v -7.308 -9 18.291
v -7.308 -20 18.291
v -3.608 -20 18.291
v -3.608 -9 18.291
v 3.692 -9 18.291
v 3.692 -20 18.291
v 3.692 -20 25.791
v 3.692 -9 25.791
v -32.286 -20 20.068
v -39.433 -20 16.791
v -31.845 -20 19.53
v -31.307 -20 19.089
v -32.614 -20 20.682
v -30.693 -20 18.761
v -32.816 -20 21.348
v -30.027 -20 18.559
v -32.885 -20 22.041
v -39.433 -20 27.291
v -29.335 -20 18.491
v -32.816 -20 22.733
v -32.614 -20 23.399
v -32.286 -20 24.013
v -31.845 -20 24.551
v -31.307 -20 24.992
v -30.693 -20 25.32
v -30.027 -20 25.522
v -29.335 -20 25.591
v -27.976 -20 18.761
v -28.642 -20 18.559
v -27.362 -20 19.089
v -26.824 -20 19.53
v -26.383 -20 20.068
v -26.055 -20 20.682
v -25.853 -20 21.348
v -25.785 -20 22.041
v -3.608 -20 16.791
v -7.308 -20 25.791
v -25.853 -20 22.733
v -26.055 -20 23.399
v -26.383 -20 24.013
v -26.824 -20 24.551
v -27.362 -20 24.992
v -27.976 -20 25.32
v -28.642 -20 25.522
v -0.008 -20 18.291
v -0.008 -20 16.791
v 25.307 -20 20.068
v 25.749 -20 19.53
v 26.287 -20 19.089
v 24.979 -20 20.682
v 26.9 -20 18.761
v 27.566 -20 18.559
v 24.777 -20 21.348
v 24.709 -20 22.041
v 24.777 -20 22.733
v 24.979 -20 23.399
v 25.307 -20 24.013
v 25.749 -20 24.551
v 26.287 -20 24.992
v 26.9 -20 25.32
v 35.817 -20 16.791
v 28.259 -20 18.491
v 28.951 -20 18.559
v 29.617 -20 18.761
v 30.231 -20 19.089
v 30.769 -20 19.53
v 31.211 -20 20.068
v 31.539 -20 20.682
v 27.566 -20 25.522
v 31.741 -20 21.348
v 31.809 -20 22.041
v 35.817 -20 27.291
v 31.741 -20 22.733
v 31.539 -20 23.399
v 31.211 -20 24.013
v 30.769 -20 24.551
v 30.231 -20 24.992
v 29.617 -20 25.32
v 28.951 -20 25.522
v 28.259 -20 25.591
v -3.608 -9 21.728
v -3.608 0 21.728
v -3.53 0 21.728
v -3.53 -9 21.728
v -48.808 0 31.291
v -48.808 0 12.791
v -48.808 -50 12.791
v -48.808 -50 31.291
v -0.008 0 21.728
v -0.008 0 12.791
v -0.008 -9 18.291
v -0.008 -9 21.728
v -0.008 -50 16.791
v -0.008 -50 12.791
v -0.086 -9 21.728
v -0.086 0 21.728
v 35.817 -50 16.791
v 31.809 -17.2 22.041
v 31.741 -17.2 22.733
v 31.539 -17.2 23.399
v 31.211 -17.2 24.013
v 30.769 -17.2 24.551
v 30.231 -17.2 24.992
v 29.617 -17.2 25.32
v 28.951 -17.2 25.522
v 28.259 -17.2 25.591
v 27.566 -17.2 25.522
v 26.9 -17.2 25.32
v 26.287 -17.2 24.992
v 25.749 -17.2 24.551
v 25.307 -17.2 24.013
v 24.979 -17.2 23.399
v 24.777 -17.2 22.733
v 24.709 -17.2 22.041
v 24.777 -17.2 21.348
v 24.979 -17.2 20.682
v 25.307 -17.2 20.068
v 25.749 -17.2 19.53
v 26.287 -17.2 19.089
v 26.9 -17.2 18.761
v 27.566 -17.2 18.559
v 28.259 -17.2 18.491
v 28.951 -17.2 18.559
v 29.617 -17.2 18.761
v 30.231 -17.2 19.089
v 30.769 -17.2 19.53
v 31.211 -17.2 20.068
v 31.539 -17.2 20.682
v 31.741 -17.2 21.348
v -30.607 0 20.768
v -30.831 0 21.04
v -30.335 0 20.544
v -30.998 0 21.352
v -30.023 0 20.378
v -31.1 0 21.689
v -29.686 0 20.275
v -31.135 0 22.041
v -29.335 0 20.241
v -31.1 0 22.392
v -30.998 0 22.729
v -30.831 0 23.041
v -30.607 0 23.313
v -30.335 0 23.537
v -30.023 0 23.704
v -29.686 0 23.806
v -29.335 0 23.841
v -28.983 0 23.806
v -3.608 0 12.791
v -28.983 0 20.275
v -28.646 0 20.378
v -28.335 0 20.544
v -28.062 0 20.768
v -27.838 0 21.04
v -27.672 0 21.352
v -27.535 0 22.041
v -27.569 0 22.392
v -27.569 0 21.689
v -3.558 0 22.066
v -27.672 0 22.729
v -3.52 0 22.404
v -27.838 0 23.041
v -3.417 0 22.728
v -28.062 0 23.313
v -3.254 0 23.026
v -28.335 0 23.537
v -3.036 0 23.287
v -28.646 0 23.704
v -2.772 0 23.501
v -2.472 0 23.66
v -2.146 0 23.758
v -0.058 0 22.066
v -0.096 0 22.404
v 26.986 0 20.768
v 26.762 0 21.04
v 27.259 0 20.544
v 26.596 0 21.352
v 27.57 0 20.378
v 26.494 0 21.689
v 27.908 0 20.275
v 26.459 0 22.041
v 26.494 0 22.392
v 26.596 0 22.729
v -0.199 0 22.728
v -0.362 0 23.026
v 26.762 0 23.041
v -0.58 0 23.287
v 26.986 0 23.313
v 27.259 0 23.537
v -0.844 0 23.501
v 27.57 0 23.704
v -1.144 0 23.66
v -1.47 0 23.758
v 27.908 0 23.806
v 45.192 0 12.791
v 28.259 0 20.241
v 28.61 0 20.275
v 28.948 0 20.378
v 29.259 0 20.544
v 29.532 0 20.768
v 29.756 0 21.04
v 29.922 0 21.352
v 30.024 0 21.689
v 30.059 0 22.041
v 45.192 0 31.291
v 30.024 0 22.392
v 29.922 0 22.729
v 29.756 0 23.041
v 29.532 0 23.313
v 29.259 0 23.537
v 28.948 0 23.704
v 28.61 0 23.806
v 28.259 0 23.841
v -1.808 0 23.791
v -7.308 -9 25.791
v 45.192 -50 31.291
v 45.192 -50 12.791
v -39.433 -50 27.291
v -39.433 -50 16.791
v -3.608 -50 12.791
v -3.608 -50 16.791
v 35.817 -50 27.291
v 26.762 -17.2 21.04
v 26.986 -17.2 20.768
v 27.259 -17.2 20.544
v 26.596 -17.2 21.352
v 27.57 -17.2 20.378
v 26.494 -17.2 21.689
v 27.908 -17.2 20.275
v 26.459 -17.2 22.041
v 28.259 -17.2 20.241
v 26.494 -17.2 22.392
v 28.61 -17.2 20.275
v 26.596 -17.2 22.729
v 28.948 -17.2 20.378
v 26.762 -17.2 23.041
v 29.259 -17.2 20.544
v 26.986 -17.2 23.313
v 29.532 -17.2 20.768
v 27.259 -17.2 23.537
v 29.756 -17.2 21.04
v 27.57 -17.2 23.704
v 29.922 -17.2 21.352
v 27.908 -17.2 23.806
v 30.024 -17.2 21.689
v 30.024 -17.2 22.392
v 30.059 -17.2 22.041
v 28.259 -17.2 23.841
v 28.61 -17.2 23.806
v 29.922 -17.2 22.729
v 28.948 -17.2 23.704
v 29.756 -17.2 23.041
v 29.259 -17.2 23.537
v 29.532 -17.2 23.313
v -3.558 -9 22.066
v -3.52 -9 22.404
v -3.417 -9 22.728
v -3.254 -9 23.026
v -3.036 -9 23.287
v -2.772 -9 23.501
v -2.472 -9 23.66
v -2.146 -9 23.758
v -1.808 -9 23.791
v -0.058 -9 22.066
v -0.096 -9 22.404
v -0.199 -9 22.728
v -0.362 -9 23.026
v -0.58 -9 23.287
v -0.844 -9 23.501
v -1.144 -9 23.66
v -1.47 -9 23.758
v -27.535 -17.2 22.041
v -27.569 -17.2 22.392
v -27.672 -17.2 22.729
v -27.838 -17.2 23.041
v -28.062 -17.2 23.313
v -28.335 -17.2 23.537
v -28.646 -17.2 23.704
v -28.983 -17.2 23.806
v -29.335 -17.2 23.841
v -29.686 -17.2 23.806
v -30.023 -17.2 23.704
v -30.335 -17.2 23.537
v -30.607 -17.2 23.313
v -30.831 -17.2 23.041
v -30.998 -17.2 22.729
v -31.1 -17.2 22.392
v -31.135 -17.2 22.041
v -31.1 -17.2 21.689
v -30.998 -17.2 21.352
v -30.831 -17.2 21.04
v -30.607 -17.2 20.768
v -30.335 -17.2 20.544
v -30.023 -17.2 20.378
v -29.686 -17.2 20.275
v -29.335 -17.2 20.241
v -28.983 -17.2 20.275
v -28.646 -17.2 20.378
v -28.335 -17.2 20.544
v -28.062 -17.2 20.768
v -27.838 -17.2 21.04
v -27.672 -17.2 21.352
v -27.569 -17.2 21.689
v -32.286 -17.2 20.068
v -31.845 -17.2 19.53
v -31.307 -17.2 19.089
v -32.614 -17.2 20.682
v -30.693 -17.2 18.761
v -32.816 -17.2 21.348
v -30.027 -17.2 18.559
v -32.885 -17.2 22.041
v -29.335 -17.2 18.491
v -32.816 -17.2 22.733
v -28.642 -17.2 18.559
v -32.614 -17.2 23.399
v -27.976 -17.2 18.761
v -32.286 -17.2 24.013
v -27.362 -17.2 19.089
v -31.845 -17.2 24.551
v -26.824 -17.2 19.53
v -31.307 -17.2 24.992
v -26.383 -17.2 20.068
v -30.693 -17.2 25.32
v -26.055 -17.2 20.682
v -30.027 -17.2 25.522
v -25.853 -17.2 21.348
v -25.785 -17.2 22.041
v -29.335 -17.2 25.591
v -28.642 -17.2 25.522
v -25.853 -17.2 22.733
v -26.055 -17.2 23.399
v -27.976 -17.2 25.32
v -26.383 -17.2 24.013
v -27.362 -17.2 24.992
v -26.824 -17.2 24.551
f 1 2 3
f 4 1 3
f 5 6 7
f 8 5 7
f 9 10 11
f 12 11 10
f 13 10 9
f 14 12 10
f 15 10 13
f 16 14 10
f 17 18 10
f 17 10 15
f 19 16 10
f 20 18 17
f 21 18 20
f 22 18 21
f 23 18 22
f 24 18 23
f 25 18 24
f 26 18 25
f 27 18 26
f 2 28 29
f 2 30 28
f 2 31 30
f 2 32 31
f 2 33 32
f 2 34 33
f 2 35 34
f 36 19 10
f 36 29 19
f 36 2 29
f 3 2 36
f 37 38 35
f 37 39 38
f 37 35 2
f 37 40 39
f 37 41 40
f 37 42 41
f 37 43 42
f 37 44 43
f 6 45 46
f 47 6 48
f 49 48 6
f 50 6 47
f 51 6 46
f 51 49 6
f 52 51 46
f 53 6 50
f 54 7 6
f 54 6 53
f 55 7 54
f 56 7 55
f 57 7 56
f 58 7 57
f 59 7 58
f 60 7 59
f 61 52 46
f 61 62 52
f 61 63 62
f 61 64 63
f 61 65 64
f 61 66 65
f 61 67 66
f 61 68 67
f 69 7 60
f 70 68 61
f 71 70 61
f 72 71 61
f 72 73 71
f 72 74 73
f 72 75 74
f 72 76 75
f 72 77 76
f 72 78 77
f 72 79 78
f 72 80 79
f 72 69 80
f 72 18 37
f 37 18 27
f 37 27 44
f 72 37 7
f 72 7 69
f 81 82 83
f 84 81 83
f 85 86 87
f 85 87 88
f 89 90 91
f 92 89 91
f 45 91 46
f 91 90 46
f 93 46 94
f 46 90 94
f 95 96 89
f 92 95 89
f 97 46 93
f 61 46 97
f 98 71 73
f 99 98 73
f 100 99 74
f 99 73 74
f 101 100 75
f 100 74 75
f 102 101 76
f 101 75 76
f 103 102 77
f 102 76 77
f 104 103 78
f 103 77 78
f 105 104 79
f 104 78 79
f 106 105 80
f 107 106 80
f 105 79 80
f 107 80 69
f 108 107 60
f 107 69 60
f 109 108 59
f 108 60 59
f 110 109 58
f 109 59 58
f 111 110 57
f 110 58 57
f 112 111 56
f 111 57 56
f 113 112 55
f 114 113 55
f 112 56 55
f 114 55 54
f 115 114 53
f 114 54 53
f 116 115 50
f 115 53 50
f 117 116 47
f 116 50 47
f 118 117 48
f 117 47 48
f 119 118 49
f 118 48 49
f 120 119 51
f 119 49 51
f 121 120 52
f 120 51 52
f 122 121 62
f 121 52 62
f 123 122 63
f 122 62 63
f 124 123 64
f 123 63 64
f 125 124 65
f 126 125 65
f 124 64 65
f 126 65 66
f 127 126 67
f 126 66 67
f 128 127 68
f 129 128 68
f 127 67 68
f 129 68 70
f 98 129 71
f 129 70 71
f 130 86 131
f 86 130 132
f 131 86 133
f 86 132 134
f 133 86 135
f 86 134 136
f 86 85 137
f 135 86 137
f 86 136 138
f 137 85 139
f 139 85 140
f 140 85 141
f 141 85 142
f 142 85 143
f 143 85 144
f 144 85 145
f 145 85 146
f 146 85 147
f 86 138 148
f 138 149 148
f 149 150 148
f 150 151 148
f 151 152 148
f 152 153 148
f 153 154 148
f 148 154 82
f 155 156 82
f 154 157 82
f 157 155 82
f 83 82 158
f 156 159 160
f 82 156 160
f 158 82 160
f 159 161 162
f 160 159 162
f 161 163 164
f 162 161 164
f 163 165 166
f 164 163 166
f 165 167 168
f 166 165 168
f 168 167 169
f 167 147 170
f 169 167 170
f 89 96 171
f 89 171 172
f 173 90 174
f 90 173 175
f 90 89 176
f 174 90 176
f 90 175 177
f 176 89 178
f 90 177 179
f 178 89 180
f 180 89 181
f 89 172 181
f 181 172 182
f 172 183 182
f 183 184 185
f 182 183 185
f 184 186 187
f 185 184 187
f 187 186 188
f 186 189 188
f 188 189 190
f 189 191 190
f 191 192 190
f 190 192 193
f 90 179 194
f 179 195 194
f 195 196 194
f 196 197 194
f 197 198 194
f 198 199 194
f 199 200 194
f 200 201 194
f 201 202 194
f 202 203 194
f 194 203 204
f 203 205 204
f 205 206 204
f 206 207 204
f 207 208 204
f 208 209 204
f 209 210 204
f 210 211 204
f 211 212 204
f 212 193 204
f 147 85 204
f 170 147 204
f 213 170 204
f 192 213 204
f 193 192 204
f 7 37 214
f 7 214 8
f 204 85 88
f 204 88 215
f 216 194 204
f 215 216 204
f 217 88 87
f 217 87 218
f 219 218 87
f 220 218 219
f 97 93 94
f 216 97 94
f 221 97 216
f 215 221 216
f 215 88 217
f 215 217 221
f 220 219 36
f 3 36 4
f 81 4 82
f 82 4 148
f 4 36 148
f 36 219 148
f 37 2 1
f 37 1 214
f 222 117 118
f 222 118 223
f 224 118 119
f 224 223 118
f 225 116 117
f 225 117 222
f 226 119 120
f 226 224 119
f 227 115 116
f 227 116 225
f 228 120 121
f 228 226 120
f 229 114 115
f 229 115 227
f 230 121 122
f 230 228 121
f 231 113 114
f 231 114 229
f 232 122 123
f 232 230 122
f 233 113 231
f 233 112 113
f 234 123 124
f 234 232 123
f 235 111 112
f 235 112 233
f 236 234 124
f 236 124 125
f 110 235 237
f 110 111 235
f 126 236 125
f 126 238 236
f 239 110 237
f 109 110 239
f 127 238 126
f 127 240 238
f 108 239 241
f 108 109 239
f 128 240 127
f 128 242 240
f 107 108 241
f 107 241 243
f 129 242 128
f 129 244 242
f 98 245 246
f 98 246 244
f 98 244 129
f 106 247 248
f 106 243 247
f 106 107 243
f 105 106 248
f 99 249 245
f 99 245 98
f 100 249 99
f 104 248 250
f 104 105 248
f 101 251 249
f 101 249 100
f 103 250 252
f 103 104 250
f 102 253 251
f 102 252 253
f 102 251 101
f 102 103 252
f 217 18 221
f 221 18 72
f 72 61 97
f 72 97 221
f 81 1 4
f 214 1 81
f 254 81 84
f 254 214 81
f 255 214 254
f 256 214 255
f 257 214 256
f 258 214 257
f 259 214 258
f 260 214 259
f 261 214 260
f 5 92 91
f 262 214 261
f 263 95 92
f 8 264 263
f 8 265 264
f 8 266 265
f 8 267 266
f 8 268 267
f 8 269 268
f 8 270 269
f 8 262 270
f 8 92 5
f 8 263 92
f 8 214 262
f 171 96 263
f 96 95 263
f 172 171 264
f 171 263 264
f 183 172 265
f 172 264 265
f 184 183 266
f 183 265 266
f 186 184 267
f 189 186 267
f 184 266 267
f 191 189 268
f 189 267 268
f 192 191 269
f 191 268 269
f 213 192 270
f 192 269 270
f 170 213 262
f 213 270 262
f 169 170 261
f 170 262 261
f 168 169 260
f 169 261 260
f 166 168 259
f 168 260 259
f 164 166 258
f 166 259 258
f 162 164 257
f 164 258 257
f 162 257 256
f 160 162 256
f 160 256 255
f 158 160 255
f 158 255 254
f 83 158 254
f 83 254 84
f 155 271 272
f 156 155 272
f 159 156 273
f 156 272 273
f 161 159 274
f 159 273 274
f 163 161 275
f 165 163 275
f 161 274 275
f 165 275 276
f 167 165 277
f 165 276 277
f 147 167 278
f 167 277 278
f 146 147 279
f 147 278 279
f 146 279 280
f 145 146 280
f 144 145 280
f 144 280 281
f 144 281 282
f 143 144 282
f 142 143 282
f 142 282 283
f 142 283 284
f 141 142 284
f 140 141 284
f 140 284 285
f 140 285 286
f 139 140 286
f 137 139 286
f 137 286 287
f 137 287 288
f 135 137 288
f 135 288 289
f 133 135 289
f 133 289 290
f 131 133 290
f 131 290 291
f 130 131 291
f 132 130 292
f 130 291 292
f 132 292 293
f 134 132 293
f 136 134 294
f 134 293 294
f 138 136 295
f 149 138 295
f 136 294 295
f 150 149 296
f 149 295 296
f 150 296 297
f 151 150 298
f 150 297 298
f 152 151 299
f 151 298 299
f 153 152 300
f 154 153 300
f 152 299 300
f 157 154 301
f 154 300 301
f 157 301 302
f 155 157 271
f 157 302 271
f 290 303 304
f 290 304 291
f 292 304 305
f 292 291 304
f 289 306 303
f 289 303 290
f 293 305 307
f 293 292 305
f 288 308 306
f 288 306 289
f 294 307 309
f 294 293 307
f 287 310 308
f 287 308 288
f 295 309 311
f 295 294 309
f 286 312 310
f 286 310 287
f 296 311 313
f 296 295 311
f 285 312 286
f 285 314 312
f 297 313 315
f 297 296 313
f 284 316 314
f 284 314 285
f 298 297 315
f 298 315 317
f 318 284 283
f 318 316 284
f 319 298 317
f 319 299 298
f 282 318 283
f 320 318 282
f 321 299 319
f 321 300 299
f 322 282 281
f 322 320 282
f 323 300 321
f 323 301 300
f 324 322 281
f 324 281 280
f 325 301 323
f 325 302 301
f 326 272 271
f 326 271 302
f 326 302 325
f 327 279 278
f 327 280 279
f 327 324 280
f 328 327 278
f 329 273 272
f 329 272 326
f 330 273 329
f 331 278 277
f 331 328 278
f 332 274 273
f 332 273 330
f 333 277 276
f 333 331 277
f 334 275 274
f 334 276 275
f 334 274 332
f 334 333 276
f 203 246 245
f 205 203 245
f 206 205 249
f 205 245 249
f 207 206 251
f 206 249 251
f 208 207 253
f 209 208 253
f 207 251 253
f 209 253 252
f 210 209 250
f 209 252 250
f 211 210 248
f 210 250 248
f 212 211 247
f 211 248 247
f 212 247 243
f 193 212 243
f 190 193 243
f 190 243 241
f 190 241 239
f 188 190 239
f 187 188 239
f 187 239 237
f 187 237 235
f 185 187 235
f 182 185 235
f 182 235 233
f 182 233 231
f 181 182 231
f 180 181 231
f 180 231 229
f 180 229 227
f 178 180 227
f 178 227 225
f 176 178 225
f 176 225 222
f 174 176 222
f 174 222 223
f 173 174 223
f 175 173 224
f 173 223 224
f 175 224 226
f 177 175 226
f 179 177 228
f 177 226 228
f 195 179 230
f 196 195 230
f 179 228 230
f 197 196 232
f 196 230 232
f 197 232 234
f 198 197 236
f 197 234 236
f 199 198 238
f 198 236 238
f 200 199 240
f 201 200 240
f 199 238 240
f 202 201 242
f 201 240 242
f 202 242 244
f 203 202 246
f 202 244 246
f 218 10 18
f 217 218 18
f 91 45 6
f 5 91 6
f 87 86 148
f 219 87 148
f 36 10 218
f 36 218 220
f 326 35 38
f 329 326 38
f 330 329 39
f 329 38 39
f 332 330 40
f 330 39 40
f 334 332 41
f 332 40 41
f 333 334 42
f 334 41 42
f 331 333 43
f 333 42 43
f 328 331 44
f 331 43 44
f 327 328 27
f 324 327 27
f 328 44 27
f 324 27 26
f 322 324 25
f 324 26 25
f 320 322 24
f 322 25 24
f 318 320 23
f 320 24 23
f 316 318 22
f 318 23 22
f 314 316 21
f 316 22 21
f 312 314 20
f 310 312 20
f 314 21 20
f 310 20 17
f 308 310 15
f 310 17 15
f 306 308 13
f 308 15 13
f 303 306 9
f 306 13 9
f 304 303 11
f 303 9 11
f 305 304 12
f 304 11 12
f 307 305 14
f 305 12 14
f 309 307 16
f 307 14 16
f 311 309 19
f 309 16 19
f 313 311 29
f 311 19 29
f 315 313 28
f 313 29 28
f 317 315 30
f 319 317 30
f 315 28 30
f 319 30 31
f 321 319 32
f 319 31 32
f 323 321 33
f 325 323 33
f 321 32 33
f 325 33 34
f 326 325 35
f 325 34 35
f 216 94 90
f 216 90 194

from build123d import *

# Parameters (mm, degrees)
F0_W      = 94
F0_H      = 18.5
F0_W_2    = 75.25
F0_H_2    = 10.5
F2_DEPTH  = 50
F1_W      = 75.25
F1_H      = 10.5
F3_DEPTH  = 20
F4_W      = 11
F4_H      = 7.5
F4_R      = 1.75
F5_DEPTH  = 11
F6_DEPTH  = 27.1777510643
F8_DEPTH  = 8.9369788766
F4_R_2    = 1.8
F9_DEPTH  = 25
F4_R_3    = 3.55
F10_DEPTH = 2.8


with BuildPart() as f2:
    # F0 (on Front) → F2 (new body)
    with BuildSketch(Plane.XZ):
        with Locations((-1.8079760883, 22.0405235887)):
            Rectangle(F0_W, F0_H)
        with Locations((-1.8079760883, 22.0405235887)):
            Rectangle(F0_W_2, F0_H_2, mode=Mode.SUBTRACT)
    extrude(amount=F2_DEPTH)

    # F1 (on face) → F3 (join)
    with BuildSketch(Plane.XZ):
        with Locations((-1.8079760883, 22.0405235887)):
            Rectangle(F1_W, F1_H)
    extrude(amount=F3_DEPTH)

    # F4 (on face) → F5 (cut)
    with BuildSketch(Plane.XZ.offset(20)):
        with Locations((-1.8079760883, 22.0405235887)):
            Rectangle(F4_W, F4_H)
        with Locations((-1.8079760883, 22.0405235887)):
            Circle(F4_R, mode=Mode.SUBTRACT)
    extrude(amount=-F5_DEPTH, mode=Mode.SUBTRACT)

    # F6 (cut): a face of the model
    f6_faces = [f2.faces().sort_by_distance(p)[0] for p in [
        (-1.8079760883, -20, 22.0405235887),
    ]]
    extrude(f6_faces, amount=-F6_DEPTH, mode=Mode.SUBTRACT)

    # F7 (on face) → F8 (cut)
    with BuildSketch(Plane(origin=(0, 0, 12.7905235887), x_dir=(1, 0, 0), z_dir=(0, 0, -1))):
        Polygon((-3.6079760883, 50), (-3.6079760883, 25), (-3.6079760883, 0), (-0.0079760883, 0), (-0.0079760883, 25), (-0.0079760883, 50), (-1.8079760883, 50), align=None)
    extrude(amount=-F8_DEPTH, mode=Mode.SUBTRACT)

    # F4 (on face) → F9 (cut)
    with BuildSketch(Plane.XZ.offset(20)):
        with Locations((-29.3346382678, 22.0405235887)):
            Circle(F4_R_2)
        with Locations((28.2589178532, 22.0405235887)):
            Circle(F4_R_2)
    extrude(amount=-F9_DEPTH, mode=Mode.SUBTRACT)

    # F4 (on face) → F10 (cut)
    with BuildSketch(Plane.XZ.offset(20)):
        with Locations((28.2589178532, 22.0405235887)):
            Circle(F4_R_3)
        with Locations((28.2589178532, 22.0405235887)):
            Circle(F4_R_2, mode=Mode.SUBTRACT)
        with Locations((-29.3346382678, 22.0405235887)):
            Circle(F4_R_3)
        with Locations((-29.3346382678, 22.0405235887)):
            Circle(F4_R_2, mode=Mode.SUBTRACT)
    extrude(amount=-F10_DEPTH, mode=Mode.SUBTRACT)


solid = f2.part
